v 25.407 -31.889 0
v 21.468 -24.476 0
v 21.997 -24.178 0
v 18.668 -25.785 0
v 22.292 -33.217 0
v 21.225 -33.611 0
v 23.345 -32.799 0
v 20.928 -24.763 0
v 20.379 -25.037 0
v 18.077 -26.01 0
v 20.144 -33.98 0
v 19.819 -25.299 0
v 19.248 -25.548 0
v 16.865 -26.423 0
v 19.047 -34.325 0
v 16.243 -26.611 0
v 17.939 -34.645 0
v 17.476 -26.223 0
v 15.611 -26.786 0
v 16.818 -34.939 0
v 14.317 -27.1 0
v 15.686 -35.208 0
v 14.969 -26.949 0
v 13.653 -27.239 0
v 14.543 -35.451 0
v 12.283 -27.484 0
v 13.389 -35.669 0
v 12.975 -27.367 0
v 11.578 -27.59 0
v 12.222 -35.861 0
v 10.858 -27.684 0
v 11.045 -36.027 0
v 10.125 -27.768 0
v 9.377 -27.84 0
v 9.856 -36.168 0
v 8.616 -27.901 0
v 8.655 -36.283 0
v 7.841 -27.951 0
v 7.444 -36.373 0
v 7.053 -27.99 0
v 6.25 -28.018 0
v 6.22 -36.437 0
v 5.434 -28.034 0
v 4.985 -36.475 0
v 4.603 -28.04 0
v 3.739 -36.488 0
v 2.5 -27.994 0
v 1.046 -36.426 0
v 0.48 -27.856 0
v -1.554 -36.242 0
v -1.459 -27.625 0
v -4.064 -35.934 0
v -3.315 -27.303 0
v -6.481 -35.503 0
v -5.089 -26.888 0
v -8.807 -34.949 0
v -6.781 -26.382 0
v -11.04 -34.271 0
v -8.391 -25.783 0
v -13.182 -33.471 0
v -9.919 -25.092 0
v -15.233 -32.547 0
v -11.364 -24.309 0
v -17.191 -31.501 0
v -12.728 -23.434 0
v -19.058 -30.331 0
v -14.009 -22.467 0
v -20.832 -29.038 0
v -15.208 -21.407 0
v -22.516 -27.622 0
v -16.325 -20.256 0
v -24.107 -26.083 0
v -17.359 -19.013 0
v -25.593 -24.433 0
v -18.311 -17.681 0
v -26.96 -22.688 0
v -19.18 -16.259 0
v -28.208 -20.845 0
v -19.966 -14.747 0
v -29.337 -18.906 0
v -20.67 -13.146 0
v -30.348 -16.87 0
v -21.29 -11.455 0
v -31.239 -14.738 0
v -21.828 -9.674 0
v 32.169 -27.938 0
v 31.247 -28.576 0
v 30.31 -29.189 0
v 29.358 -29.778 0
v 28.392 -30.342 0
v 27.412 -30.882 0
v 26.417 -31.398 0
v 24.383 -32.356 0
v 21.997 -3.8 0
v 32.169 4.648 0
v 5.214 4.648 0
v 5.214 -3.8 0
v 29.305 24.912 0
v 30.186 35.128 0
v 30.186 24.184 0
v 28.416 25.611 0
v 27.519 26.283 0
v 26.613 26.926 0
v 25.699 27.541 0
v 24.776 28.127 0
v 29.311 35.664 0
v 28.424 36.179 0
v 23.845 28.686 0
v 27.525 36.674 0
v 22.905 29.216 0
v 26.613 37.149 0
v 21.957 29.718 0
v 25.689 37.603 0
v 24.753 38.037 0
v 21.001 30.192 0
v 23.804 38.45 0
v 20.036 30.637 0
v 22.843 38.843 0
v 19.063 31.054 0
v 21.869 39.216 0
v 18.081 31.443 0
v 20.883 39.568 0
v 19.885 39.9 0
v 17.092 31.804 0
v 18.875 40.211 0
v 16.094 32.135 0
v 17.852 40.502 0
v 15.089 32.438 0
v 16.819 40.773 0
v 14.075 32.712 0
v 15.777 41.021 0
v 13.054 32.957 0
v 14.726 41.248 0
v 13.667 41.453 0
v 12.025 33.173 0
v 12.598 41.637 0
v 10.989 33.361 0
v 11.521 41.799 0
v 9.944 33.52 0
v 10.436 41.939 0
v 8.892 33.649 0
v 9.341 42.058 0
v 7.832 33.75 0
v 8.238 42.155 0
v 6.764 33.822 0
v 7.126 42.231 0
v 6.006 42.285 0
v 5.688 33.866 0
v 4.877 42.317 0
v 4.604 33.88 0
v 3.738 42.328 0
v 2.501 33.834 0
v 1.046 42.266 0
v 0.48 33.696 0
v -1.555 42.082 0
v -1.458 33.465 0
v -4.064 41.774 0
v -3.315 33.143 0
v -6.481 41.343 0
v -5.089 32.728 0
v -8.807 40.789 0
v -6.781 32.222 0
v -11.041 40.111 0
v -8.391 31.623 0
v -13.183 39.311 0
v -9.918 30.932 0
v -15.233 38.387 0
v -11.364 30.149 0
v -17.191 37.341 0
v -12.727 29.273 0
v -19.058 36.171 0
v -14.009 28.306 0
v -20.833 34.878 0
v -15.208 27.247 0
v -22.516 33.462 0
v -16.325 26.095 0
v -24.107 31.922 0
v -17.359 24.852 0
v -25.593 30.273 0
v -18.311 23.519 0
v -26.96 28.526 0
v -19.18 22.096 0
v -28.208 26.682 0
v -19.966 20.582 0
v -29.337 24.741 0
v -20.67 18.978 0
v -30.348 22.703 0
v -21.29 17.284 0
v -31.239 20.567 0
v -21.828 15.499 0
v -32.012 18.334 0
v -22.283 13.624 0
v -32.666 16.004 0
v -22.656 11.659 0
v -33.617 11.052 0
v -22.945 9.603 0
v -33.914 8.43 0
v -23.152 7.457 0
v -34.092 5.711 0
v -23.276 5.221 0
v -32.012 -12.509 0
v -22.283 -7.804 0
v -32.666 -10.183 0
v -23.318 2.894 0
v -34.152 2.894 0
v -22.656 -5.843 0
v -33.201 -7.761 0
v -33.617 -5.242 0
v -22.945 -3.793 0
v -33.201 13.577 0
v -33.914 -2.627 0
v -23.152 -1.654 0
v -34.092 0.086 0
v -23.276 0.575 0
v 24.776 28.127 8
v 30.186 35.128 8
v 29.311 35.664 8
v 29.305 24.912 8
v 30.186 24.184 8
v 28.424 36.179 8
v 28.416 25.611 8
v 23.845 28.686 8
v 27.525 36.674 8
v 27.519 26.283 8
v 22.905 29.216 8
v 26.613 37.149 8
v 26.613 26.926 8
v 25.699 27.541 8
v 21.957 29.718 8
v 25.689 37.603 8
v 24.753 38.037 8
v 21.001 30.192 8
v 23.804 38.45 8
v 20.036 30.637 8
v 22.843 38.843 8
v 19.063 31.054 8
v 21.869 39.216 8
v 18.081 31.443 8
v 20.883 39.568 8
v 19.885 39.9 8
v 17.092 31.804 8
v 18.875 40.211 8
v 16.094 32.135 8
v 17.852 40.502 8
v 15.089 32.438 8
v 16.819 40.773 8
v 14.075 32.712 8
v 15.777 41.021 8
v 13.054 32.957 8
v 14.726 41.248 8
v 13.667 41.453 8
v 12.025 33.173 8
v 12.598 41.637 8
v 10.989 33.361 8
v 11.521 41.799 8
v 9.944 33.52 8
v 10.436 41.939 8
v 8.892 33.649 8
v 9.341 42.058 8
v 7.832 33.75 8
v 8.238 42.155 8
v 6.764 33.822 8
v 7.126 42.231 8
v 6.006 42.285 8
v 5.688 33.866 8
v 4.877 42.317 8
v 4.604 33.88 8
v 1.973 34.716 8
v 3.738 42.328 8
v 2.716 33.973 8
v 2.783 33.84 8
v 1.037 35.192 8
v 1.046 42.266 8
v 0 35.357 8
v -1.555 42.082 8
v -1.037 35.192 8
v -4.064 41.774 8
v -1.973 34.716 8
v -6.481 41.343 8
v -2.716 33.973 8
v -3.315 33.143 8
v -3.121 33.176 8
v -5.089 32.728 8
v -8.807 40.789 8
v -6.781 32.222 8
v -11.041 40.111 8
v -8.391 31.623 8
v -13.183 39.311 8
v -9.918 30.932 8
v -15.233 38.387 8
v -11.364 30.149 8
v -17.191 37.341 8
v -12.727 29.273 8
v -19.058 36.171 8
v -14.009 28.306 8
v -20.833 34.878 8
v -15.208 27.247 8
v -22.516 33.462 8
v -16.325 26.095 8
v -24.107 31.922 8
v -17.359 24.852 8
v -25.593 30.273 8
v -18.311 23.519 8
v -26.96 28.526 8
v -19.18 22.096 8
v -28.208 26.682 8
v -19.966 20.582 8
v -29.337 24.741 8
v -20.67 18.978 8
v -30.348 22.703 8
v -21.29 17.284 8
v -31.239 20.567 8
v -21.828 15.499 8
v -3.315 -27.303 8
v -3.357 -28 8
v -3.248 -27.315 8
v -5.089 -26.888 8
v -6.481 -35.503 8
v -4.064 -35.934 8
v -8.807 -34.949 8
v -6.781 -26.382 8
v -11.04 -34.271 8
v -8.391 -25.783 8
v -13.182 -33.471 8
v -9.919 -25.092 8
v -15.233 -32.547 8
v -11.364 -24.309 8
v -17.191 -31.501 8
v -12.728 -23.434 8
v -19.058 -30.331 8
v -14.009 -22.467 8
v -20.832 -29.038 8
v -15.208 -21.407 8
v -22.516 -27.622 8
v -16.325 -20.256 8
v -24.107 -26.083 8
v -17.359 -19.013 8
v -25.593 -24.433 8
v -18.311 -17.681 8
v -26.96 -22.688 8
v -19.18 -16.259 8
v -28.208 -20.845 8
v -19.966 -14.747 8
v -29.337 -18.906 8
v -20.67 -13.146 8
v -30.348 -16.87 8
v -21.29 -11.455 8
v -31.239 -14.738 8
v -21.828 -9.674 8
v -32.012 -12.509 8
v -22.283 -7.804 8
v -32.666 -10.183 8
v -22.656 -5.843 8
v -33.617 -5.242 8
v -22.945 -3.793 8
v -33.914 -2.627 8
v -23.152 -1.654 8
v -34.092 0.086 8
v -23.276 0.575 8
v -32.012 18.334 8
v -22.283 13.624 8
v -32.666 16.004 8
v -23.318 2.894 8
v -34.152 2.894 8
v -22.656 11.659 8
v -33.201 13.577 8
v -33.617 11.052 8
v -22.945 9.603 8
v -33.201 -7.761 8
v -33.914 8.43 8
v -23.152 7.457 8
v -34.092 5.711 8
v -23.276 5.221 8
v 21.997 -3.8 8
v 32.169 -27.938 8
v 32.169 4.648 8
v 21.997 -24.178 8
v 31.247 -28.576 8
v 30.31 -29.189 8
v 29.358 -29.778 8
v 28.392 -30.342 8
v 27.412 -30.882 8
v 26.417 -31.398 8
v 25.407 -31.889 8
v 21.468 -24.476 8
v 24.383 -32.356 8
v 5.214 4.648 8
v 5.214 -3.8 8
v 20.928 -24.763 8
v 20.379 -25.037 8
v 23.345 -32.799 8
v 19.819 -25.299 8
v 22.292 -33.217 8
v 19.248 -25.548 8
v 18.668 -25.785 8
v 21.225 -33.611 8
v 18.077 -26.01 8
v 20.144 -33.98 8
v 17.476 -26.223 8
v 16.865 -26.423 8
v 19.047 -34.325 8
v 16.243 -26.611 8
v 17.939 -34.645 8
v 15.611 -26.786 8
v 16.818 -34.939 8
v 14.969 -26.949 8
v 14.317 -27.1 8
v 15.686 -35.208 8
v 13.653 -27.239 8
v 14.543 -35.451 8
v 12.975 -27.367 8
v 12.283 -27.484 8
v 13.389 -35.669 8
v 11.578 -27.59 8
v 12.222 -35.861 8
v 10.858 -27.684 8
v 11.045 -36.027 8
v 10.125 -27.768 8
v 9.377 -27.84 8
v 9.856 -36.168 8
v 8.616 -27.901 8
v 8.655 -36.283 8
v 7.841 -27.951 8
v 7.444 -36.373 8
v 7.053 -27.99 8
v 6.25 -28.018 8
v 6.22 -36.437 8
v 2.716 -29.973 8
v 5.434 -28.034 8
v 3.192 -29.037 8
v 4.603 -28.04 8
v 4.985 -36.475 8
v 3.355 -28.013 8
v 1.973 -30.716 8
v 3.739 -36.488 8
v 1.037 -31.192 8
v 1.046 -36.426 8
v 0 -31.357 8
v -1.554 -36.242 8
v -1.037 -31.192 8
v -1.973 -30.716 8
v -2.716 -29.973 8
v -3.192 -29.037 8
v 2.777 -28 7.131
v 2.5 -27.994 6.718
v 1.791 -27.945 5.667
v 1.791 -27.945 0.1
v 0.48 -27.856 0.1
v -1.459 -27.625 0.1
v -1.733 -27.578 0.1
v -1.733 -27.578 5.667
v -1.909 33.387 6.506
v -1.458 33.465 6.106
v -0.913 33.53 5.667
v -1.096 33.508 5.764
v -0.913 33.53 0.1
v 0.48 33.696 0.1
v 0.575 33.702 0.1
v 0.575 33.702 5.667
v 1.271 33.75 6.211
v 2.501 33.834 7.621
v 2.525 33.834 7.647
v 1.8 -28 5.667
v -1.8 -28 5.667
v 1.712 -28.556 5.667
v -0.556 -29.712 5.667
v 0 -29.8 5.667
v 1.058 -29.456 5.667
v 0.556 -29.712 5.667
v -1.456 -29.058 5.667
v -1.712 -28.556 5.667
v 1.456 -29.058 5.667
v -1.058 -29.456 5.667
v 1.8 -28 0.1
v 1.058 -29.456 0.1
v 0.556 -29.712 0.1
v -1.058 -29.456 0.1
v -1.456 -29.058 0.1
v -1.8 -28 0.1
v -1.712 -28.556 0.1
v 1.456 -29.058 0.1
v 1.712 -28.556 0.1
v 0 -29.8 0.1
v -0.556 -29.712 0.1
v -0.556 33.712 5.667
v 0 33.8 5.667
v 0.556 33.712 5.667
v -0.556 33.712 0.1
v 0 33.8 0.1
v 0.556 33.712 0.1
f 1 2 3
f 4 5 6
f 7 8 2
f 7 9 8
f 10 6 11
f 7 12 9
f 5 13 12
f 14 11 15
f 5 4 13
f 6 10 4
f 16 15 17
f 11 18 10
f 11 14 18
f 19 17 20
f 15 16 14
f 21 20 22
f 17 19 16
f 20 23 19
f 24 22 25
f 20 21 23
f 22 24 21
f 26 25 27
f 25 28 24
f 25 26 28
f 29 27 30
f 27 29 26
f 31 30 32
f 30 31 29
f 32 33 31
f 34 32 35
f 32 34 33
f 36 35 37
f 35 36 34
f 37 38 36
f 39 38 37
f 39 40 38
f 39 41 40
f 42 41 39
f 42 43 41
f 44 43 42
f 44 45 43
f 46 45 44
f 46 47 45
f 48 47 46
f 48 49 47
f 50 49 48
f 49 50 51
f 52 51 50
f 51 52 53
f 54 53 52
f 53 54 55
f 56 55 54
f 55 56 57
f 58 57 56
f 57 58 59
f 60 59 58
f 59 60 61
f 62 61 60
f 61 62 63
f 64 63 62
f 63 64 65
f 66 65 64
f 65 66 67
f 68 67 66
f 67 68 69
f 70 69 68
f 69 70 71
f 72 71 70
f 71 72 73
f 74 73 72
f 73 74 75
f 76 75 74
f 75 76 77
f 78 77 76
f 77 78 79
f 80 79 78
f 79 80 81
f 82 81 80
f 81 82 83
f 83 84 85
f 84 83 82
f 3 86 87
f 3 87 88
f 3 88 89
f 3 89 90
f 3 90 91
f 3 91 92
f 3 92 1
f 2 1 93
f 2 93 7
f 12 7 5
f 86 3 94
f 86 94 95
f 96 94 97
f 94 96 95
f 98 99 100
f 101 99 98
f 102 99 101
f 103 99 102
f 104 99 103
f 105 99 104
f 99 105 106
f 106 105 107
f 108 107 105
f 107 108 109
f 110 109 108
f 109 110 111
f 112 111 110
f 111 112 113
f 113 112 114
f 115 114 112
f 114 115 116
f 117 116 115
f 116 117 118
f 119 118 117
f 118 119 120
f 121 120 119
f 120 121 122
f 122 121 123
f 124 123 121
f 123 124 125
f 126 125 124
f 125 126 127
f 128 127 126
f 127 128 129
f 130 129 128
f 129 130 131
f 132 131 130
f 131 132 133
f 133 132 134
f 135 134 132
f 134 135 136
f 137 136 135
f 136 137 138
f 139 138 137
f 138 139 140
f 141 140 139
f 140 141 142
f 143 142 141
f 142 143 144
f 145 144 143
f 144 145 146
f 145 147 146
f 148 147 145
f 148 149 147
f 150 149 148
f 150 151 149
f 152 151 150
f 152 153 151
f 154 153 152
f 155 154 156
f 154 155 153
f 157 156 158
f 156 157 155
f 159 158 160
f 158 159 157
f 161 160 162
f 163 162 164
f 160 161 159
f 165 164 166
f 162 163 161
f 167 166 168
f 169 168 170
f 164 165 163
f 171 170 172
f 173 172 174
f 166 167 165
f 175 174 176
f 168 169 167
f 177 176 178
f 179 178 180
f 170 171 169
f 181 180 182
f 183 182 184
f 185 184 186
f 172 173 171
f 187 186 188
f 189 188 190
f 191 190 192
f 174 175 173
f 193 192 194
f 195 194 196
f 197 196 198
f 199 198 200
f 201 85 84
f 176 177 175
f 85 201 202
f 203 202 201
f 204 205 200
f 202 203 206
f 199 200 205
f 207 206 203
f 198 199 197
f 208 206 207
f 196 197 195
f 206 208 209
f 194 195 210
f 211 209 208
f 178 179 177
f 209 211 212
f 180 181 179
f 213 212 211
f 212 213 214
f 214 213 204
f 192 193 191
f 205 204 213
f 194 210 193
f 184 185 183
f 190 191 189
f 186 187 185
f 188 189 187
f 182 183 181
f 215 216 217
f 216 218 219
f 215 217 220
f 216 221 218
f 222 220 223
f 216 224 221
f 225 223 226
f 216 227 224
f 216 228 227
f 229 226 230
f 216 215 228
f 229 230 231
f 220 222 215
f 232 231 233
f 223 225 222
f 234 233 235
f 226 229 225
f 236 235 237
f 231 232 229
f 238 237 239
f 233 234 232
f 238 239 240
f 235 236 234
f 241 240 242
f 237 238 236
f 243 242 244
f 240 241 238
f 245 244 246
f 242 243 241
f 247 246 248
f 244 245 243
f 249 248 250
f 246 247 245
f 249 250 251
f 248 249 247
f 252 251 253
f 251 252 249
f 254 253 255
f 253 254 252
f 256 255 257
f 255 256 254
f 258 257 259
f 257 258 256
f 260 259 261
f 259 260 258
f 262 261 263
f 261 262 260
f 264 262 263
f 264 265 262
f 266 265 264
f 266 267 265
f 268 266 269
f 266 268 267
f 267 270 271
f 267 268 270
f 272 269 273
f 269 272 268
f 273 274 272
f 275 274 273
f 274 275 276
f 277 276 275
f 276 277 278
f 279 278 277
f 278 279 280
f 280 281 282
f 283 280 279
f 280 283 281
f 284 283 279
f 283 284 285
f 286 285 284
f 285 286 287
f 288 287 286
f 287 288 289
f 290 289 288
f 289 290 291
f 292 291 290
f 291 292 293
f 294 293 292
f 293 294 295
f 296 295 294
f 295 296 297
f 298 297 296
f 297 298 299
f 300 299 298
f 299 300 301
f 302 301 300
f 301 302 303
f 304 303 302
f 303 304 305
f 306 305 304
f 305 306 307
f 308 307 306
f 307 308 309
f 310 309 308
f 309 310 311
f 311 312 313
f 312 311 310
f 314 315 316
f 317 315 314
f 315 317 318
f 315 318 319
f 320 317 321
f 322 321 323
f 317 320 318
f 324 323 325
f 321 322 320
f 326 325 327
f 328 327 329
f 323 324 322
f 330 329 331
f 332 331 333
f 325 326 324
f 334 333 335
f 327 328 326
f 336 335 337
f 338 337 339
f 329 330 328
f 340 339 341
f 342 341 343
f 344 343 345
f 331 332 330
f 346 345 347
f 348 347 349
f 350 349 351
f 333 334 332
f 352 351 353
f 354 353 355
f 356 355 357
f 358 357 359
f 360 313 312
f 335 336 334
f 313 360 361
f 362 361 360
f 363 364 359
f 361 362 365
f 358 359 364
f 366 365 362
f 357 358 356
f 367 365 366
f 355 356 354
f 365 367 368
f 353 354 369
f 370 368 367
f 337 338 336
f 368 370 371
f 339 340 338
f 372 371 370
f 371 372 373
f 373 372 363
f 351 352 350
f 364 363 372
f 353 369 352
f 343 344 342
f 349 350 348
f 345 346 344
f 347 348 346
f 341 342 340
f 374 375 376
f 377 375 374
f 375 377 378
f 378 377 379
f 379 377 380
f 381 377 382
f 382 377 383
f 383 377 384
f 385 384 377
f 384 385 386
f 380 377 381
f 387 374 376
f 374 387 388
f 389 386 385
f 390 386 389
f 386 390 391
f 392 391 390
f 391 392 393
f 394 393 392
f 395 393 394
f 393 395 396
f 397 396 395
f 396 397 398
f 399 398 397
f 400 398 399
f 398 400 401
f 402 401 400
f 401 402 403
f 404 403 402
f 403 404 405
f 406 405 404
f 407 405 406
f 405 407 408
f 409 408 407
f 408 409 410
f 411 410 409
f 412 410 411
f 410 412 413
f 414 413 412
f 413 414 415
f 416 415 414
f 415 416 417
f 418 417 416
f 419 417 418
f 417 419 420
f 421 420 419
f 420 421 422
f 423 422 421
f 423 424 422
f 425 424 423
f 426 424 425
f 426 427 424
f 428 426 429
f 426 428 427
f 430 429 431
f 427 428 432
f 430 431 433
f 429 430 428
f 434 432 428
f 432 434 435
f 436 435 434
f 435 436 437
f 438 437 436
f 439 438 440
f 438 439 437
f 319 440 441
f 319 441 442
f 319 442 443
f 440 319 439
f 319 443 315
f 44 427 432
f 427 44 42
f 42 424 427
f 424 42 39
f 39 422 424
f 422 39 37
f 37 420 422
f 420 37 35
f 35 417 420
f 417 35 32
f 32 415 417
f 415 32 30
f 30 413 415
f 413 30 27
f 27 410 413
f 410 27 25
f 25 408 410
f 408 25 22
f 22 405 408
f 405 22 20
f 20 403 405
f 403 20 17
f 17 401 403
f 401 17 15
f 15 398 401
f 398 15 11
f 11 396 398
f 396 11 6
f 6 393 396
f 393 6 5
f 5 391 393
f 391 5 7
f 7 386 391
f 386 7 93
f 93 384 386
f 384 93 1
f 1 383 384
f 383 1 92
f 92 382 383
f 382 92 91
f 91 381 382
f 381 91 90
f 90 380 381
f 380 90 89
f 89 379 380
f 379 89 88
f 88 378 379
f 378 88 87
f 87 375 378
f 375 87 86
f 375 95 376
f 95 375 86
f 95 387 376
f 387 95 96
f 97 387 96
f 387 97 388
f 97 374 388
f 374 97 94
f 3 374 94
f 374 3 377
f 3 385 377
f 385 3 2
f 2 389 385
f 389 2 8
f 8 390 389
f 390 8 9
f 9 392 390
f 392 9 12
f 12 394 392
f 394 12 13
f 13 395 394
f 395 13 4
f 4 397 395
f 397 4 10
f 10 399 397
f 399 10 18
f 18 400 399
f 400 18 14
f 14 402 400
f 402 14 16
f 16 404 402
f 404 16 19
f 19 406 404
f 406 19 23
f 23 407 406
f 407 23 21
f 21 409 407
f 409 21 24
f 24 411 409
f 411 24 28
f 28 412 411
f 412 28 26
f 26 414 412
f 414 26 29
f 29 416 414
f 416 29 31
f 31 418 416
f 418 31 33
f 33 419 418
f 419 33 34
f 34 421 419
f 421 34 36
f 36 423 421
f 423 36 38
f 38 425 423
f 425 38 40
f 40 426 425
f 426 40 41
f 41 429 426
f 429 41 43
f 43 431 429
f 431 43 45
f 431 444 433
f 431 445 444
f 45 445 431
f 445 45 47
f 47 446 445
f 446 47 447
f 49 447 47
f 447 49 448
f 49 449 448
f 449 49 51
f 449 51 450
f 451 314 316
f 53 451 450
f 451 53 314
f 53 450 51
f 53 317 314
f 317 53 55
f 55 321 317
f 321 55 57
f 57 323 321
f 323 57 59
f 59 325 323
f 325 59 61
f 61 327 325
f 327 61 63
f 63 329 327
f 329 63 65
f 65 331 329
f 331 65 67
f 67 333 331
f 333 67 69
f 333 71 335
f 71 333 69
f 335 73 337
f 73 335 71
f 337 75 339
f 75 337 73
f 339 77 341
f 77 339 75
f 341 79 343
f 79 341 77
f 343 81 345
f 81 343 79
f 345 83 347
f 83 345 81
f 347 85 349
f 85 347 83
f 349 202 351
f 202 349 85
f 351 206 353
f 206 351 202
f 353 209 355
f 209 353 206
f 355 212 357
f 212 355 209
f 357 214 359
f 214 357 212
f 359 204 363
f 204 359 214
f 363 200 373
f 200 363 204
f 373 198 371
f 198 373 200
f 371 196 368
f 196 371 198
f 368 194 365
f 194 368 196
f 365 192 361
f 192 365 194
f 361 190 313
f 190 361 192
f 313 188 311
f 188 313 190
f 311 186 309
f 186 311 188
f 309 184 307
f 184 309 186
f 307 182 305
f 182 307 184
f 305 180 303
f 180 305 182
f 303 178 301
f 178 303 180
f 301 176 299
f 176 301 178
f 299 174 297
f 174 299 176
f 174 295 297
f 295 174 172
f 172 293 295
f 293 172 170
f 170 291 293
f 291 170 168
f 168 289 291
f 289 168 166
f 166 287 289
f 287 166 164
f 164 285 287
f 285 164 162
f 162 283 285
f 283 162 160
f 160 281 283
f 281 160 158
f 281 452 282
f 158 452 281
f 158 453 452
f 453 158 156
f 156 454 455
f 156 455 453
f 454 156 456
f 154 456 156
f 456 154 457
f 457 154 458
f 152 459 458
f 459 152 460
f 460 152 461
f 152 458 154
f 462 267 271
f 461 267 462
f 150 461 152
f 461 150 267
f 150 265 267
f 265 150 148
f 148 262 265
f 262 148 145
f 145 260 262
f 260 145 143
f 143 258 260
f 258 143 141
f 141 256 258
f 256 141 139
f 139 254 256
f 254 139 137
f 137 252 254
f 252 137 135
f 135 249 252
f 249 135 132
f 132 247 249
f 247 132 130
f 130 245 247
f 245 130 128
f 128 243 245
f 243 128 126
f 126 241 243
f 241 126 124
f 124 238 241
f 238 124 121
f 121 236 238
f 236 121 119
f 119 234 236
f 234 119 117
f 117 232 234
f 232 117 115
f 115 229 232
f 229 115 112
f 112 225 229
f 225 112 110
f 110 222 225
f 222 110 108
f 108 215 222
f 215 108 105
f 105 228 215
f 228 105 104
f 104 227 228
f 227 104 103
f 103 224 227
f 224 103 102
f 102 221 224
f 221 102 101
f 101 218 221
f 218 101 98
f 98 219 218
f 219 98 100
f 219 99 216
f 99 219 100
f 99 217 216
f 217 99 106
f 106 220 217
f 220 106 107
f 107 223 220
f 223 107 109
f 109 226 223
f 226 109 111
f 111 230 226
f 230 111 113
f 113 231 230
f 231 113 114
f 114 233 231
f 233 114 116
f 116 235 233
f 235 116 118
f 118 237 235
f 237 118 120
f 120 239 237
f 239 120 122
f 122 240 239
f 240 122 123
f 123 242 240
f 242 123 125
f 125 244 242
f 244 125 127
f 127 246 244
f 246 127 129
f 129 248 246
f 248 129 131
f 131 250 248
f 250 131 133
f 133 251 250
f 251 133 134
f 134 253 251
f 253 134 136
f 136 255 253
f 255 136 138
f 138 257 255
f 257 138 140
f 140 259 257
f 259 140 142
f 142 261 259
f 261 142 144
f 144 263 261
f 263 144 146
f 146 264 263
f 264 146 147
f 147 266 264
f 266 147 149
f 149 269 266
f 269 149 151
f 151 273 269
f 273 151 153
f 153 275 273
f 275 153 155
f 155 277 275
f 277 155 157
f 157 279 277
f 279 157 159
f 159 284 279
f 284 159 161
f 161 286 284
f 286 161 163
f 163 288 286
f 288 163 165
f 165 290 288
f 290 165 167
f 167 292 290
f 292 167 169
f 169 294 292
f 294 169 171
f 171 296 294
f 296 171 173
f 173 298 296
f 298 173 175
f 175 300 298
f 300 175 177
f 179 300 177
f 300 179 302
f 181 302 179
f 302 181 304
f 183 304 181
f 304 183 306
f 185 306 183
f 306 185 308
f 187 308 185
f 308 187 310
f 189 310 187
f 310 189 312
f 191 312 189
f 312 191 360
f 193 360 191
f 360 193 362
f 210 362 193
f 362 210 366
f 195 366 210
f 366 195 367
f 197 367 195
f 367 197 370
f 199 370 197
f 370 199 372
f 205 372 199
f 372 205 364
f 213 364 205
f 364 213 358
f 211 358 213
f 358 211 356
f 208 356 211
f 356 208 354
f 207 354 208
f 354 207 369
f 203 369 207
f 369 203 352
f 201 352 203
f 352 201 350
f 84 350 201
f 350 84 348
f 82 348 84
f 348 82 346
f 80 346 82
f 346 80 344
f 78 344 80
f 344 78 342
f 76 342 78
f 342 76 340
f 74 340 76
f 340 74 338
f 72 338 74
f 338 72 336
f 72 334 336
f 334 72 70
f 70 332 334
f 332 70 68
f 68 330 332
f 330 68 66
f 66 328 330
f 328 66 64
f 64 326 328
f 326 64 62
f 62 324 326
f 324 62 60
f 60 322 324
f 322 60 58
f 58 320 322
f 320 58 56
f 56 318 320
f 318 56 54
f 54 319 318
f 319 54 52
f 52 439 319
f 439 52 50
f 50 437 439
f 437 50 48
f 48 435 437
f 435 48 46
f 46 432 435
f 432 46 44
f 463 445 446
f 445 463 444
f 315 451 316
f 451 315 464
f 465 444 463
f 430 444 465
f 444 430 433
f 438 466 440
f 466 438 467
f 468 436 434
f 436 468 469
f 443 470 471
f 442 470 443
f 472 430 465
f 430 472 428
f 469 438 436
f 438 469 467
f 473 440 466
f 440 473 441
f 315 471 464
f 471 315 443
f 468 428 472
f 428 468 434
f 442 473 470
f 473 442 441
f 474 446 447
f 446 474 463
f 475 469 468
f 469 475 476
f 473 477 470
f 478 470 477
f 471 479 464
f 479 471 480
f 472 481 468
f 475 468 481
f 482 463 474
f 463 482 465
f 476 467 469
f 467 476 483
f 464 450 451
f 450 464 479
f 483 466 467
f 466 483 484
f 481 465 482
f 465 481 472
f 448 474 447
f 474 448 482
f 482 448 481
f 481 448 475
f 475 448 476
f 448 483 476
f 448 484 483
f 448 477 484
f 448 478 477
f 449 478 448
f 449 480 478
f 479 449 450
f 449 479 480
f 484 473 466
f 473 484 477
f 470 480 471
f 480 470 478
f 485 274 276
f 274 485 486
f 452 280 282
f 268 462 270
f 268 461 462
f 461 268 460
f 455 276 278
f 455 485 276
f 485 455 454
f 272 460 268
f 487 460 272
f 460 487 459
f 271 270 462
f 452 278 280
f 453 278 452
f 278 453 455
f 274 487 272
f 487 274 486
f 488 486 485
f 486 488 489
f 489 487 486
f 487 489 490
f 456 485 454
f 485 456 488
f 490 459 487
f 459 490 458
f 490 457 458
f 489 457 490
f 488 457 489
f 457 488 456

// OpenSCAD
// Street Numbers for 3D printing
// Charles Tilford, 2019
// License: CC BY-NC-SA 4.0
//   https://creativecommons.org/licenses/by-nc-sa/4.0/

char="G";     // The number/letter to print

// Units are in mm, except for height of letter

// How many inches high should letter be?
inchesHigh=3;
// How thick/deep should letter be (mm)?
depth=8;

// Character coordinates just center the letter
charX=-40;    // Character X coord
charY=-35;    // Character Y coord
topScrew=32;  // Top screw Y coord
botScrew=-28; // Bottom screw Y coord
height=8;     // Thickness of character
// Screw dimensions. Default presumes
// #6 sheet metal screw
screwWid=3.6; // Width of screw shaft
screwTop=6.78;// Width of screw head
screwCon=5.08;// Height of head 'cone'

// Font to print in. Your system needs this
// installed, of course. If changed the hole
// positions almost certainly need to be
// changed, and maybe charX/charY.
fName="Open Sans Extrabold";
// https://fonts.google.com/specimen/Open+Sans
// Designer: Steve Matteson

// Thin floor below holes. My printer was
// struggling to have the hole 'border' stick
// to the stage. Just drill/screw thru it.
holeFloor=0.1; 

// ==========================================
// ===== All values below are auto-calculated
// ==========================================

// Scaled values
scaleFactor=inchesHigh / 3;
cX=charX * scaleFactor;
cY=charY * scaleFactor;
tS=topScrew * scaleFactor;
bS=botScrew * scaleFactor;
// Where do we start drawing screw head cone?
oS=depth - (screwCon-.05);

difference() {
  // We use difference() to punch out the screw holes
  // in the character
    
  // The character itself, 8mm thick
  translate([cX,cY,0])
    linear_extrude(height=depth, scale=1)
    text(char, size=(75*scaleFactor),
         $fn=100, font=fName);
    
  // Bottom screw hole
  translate([0,bS,oS]) color("red")
    cylinder(h=screwCon, d2=screwTop,
             d1=0, $fn=20);
   translate([0,bS,holeFloor])
    cylinder(h=20, d=screwWid, $fn=20);
    
  // Top screw hole
  translate([0,tS,oS]) color("red")
    cylinder(h=screwCon, d2=screwTop,
             d1=0, $fn=20);
  translate([0,tS,holeFloor])
    cylinder(h=20, d=screwWid, $fn=20);
}

// Colors are just to aid visualization of
// void spaces. $fn is "featuer number", ie how
// many polygons are devoted to object. The values
// above should be near your printing limit anyway.

// Developed in OpenSCAD
//    https://www.openscad.org/
